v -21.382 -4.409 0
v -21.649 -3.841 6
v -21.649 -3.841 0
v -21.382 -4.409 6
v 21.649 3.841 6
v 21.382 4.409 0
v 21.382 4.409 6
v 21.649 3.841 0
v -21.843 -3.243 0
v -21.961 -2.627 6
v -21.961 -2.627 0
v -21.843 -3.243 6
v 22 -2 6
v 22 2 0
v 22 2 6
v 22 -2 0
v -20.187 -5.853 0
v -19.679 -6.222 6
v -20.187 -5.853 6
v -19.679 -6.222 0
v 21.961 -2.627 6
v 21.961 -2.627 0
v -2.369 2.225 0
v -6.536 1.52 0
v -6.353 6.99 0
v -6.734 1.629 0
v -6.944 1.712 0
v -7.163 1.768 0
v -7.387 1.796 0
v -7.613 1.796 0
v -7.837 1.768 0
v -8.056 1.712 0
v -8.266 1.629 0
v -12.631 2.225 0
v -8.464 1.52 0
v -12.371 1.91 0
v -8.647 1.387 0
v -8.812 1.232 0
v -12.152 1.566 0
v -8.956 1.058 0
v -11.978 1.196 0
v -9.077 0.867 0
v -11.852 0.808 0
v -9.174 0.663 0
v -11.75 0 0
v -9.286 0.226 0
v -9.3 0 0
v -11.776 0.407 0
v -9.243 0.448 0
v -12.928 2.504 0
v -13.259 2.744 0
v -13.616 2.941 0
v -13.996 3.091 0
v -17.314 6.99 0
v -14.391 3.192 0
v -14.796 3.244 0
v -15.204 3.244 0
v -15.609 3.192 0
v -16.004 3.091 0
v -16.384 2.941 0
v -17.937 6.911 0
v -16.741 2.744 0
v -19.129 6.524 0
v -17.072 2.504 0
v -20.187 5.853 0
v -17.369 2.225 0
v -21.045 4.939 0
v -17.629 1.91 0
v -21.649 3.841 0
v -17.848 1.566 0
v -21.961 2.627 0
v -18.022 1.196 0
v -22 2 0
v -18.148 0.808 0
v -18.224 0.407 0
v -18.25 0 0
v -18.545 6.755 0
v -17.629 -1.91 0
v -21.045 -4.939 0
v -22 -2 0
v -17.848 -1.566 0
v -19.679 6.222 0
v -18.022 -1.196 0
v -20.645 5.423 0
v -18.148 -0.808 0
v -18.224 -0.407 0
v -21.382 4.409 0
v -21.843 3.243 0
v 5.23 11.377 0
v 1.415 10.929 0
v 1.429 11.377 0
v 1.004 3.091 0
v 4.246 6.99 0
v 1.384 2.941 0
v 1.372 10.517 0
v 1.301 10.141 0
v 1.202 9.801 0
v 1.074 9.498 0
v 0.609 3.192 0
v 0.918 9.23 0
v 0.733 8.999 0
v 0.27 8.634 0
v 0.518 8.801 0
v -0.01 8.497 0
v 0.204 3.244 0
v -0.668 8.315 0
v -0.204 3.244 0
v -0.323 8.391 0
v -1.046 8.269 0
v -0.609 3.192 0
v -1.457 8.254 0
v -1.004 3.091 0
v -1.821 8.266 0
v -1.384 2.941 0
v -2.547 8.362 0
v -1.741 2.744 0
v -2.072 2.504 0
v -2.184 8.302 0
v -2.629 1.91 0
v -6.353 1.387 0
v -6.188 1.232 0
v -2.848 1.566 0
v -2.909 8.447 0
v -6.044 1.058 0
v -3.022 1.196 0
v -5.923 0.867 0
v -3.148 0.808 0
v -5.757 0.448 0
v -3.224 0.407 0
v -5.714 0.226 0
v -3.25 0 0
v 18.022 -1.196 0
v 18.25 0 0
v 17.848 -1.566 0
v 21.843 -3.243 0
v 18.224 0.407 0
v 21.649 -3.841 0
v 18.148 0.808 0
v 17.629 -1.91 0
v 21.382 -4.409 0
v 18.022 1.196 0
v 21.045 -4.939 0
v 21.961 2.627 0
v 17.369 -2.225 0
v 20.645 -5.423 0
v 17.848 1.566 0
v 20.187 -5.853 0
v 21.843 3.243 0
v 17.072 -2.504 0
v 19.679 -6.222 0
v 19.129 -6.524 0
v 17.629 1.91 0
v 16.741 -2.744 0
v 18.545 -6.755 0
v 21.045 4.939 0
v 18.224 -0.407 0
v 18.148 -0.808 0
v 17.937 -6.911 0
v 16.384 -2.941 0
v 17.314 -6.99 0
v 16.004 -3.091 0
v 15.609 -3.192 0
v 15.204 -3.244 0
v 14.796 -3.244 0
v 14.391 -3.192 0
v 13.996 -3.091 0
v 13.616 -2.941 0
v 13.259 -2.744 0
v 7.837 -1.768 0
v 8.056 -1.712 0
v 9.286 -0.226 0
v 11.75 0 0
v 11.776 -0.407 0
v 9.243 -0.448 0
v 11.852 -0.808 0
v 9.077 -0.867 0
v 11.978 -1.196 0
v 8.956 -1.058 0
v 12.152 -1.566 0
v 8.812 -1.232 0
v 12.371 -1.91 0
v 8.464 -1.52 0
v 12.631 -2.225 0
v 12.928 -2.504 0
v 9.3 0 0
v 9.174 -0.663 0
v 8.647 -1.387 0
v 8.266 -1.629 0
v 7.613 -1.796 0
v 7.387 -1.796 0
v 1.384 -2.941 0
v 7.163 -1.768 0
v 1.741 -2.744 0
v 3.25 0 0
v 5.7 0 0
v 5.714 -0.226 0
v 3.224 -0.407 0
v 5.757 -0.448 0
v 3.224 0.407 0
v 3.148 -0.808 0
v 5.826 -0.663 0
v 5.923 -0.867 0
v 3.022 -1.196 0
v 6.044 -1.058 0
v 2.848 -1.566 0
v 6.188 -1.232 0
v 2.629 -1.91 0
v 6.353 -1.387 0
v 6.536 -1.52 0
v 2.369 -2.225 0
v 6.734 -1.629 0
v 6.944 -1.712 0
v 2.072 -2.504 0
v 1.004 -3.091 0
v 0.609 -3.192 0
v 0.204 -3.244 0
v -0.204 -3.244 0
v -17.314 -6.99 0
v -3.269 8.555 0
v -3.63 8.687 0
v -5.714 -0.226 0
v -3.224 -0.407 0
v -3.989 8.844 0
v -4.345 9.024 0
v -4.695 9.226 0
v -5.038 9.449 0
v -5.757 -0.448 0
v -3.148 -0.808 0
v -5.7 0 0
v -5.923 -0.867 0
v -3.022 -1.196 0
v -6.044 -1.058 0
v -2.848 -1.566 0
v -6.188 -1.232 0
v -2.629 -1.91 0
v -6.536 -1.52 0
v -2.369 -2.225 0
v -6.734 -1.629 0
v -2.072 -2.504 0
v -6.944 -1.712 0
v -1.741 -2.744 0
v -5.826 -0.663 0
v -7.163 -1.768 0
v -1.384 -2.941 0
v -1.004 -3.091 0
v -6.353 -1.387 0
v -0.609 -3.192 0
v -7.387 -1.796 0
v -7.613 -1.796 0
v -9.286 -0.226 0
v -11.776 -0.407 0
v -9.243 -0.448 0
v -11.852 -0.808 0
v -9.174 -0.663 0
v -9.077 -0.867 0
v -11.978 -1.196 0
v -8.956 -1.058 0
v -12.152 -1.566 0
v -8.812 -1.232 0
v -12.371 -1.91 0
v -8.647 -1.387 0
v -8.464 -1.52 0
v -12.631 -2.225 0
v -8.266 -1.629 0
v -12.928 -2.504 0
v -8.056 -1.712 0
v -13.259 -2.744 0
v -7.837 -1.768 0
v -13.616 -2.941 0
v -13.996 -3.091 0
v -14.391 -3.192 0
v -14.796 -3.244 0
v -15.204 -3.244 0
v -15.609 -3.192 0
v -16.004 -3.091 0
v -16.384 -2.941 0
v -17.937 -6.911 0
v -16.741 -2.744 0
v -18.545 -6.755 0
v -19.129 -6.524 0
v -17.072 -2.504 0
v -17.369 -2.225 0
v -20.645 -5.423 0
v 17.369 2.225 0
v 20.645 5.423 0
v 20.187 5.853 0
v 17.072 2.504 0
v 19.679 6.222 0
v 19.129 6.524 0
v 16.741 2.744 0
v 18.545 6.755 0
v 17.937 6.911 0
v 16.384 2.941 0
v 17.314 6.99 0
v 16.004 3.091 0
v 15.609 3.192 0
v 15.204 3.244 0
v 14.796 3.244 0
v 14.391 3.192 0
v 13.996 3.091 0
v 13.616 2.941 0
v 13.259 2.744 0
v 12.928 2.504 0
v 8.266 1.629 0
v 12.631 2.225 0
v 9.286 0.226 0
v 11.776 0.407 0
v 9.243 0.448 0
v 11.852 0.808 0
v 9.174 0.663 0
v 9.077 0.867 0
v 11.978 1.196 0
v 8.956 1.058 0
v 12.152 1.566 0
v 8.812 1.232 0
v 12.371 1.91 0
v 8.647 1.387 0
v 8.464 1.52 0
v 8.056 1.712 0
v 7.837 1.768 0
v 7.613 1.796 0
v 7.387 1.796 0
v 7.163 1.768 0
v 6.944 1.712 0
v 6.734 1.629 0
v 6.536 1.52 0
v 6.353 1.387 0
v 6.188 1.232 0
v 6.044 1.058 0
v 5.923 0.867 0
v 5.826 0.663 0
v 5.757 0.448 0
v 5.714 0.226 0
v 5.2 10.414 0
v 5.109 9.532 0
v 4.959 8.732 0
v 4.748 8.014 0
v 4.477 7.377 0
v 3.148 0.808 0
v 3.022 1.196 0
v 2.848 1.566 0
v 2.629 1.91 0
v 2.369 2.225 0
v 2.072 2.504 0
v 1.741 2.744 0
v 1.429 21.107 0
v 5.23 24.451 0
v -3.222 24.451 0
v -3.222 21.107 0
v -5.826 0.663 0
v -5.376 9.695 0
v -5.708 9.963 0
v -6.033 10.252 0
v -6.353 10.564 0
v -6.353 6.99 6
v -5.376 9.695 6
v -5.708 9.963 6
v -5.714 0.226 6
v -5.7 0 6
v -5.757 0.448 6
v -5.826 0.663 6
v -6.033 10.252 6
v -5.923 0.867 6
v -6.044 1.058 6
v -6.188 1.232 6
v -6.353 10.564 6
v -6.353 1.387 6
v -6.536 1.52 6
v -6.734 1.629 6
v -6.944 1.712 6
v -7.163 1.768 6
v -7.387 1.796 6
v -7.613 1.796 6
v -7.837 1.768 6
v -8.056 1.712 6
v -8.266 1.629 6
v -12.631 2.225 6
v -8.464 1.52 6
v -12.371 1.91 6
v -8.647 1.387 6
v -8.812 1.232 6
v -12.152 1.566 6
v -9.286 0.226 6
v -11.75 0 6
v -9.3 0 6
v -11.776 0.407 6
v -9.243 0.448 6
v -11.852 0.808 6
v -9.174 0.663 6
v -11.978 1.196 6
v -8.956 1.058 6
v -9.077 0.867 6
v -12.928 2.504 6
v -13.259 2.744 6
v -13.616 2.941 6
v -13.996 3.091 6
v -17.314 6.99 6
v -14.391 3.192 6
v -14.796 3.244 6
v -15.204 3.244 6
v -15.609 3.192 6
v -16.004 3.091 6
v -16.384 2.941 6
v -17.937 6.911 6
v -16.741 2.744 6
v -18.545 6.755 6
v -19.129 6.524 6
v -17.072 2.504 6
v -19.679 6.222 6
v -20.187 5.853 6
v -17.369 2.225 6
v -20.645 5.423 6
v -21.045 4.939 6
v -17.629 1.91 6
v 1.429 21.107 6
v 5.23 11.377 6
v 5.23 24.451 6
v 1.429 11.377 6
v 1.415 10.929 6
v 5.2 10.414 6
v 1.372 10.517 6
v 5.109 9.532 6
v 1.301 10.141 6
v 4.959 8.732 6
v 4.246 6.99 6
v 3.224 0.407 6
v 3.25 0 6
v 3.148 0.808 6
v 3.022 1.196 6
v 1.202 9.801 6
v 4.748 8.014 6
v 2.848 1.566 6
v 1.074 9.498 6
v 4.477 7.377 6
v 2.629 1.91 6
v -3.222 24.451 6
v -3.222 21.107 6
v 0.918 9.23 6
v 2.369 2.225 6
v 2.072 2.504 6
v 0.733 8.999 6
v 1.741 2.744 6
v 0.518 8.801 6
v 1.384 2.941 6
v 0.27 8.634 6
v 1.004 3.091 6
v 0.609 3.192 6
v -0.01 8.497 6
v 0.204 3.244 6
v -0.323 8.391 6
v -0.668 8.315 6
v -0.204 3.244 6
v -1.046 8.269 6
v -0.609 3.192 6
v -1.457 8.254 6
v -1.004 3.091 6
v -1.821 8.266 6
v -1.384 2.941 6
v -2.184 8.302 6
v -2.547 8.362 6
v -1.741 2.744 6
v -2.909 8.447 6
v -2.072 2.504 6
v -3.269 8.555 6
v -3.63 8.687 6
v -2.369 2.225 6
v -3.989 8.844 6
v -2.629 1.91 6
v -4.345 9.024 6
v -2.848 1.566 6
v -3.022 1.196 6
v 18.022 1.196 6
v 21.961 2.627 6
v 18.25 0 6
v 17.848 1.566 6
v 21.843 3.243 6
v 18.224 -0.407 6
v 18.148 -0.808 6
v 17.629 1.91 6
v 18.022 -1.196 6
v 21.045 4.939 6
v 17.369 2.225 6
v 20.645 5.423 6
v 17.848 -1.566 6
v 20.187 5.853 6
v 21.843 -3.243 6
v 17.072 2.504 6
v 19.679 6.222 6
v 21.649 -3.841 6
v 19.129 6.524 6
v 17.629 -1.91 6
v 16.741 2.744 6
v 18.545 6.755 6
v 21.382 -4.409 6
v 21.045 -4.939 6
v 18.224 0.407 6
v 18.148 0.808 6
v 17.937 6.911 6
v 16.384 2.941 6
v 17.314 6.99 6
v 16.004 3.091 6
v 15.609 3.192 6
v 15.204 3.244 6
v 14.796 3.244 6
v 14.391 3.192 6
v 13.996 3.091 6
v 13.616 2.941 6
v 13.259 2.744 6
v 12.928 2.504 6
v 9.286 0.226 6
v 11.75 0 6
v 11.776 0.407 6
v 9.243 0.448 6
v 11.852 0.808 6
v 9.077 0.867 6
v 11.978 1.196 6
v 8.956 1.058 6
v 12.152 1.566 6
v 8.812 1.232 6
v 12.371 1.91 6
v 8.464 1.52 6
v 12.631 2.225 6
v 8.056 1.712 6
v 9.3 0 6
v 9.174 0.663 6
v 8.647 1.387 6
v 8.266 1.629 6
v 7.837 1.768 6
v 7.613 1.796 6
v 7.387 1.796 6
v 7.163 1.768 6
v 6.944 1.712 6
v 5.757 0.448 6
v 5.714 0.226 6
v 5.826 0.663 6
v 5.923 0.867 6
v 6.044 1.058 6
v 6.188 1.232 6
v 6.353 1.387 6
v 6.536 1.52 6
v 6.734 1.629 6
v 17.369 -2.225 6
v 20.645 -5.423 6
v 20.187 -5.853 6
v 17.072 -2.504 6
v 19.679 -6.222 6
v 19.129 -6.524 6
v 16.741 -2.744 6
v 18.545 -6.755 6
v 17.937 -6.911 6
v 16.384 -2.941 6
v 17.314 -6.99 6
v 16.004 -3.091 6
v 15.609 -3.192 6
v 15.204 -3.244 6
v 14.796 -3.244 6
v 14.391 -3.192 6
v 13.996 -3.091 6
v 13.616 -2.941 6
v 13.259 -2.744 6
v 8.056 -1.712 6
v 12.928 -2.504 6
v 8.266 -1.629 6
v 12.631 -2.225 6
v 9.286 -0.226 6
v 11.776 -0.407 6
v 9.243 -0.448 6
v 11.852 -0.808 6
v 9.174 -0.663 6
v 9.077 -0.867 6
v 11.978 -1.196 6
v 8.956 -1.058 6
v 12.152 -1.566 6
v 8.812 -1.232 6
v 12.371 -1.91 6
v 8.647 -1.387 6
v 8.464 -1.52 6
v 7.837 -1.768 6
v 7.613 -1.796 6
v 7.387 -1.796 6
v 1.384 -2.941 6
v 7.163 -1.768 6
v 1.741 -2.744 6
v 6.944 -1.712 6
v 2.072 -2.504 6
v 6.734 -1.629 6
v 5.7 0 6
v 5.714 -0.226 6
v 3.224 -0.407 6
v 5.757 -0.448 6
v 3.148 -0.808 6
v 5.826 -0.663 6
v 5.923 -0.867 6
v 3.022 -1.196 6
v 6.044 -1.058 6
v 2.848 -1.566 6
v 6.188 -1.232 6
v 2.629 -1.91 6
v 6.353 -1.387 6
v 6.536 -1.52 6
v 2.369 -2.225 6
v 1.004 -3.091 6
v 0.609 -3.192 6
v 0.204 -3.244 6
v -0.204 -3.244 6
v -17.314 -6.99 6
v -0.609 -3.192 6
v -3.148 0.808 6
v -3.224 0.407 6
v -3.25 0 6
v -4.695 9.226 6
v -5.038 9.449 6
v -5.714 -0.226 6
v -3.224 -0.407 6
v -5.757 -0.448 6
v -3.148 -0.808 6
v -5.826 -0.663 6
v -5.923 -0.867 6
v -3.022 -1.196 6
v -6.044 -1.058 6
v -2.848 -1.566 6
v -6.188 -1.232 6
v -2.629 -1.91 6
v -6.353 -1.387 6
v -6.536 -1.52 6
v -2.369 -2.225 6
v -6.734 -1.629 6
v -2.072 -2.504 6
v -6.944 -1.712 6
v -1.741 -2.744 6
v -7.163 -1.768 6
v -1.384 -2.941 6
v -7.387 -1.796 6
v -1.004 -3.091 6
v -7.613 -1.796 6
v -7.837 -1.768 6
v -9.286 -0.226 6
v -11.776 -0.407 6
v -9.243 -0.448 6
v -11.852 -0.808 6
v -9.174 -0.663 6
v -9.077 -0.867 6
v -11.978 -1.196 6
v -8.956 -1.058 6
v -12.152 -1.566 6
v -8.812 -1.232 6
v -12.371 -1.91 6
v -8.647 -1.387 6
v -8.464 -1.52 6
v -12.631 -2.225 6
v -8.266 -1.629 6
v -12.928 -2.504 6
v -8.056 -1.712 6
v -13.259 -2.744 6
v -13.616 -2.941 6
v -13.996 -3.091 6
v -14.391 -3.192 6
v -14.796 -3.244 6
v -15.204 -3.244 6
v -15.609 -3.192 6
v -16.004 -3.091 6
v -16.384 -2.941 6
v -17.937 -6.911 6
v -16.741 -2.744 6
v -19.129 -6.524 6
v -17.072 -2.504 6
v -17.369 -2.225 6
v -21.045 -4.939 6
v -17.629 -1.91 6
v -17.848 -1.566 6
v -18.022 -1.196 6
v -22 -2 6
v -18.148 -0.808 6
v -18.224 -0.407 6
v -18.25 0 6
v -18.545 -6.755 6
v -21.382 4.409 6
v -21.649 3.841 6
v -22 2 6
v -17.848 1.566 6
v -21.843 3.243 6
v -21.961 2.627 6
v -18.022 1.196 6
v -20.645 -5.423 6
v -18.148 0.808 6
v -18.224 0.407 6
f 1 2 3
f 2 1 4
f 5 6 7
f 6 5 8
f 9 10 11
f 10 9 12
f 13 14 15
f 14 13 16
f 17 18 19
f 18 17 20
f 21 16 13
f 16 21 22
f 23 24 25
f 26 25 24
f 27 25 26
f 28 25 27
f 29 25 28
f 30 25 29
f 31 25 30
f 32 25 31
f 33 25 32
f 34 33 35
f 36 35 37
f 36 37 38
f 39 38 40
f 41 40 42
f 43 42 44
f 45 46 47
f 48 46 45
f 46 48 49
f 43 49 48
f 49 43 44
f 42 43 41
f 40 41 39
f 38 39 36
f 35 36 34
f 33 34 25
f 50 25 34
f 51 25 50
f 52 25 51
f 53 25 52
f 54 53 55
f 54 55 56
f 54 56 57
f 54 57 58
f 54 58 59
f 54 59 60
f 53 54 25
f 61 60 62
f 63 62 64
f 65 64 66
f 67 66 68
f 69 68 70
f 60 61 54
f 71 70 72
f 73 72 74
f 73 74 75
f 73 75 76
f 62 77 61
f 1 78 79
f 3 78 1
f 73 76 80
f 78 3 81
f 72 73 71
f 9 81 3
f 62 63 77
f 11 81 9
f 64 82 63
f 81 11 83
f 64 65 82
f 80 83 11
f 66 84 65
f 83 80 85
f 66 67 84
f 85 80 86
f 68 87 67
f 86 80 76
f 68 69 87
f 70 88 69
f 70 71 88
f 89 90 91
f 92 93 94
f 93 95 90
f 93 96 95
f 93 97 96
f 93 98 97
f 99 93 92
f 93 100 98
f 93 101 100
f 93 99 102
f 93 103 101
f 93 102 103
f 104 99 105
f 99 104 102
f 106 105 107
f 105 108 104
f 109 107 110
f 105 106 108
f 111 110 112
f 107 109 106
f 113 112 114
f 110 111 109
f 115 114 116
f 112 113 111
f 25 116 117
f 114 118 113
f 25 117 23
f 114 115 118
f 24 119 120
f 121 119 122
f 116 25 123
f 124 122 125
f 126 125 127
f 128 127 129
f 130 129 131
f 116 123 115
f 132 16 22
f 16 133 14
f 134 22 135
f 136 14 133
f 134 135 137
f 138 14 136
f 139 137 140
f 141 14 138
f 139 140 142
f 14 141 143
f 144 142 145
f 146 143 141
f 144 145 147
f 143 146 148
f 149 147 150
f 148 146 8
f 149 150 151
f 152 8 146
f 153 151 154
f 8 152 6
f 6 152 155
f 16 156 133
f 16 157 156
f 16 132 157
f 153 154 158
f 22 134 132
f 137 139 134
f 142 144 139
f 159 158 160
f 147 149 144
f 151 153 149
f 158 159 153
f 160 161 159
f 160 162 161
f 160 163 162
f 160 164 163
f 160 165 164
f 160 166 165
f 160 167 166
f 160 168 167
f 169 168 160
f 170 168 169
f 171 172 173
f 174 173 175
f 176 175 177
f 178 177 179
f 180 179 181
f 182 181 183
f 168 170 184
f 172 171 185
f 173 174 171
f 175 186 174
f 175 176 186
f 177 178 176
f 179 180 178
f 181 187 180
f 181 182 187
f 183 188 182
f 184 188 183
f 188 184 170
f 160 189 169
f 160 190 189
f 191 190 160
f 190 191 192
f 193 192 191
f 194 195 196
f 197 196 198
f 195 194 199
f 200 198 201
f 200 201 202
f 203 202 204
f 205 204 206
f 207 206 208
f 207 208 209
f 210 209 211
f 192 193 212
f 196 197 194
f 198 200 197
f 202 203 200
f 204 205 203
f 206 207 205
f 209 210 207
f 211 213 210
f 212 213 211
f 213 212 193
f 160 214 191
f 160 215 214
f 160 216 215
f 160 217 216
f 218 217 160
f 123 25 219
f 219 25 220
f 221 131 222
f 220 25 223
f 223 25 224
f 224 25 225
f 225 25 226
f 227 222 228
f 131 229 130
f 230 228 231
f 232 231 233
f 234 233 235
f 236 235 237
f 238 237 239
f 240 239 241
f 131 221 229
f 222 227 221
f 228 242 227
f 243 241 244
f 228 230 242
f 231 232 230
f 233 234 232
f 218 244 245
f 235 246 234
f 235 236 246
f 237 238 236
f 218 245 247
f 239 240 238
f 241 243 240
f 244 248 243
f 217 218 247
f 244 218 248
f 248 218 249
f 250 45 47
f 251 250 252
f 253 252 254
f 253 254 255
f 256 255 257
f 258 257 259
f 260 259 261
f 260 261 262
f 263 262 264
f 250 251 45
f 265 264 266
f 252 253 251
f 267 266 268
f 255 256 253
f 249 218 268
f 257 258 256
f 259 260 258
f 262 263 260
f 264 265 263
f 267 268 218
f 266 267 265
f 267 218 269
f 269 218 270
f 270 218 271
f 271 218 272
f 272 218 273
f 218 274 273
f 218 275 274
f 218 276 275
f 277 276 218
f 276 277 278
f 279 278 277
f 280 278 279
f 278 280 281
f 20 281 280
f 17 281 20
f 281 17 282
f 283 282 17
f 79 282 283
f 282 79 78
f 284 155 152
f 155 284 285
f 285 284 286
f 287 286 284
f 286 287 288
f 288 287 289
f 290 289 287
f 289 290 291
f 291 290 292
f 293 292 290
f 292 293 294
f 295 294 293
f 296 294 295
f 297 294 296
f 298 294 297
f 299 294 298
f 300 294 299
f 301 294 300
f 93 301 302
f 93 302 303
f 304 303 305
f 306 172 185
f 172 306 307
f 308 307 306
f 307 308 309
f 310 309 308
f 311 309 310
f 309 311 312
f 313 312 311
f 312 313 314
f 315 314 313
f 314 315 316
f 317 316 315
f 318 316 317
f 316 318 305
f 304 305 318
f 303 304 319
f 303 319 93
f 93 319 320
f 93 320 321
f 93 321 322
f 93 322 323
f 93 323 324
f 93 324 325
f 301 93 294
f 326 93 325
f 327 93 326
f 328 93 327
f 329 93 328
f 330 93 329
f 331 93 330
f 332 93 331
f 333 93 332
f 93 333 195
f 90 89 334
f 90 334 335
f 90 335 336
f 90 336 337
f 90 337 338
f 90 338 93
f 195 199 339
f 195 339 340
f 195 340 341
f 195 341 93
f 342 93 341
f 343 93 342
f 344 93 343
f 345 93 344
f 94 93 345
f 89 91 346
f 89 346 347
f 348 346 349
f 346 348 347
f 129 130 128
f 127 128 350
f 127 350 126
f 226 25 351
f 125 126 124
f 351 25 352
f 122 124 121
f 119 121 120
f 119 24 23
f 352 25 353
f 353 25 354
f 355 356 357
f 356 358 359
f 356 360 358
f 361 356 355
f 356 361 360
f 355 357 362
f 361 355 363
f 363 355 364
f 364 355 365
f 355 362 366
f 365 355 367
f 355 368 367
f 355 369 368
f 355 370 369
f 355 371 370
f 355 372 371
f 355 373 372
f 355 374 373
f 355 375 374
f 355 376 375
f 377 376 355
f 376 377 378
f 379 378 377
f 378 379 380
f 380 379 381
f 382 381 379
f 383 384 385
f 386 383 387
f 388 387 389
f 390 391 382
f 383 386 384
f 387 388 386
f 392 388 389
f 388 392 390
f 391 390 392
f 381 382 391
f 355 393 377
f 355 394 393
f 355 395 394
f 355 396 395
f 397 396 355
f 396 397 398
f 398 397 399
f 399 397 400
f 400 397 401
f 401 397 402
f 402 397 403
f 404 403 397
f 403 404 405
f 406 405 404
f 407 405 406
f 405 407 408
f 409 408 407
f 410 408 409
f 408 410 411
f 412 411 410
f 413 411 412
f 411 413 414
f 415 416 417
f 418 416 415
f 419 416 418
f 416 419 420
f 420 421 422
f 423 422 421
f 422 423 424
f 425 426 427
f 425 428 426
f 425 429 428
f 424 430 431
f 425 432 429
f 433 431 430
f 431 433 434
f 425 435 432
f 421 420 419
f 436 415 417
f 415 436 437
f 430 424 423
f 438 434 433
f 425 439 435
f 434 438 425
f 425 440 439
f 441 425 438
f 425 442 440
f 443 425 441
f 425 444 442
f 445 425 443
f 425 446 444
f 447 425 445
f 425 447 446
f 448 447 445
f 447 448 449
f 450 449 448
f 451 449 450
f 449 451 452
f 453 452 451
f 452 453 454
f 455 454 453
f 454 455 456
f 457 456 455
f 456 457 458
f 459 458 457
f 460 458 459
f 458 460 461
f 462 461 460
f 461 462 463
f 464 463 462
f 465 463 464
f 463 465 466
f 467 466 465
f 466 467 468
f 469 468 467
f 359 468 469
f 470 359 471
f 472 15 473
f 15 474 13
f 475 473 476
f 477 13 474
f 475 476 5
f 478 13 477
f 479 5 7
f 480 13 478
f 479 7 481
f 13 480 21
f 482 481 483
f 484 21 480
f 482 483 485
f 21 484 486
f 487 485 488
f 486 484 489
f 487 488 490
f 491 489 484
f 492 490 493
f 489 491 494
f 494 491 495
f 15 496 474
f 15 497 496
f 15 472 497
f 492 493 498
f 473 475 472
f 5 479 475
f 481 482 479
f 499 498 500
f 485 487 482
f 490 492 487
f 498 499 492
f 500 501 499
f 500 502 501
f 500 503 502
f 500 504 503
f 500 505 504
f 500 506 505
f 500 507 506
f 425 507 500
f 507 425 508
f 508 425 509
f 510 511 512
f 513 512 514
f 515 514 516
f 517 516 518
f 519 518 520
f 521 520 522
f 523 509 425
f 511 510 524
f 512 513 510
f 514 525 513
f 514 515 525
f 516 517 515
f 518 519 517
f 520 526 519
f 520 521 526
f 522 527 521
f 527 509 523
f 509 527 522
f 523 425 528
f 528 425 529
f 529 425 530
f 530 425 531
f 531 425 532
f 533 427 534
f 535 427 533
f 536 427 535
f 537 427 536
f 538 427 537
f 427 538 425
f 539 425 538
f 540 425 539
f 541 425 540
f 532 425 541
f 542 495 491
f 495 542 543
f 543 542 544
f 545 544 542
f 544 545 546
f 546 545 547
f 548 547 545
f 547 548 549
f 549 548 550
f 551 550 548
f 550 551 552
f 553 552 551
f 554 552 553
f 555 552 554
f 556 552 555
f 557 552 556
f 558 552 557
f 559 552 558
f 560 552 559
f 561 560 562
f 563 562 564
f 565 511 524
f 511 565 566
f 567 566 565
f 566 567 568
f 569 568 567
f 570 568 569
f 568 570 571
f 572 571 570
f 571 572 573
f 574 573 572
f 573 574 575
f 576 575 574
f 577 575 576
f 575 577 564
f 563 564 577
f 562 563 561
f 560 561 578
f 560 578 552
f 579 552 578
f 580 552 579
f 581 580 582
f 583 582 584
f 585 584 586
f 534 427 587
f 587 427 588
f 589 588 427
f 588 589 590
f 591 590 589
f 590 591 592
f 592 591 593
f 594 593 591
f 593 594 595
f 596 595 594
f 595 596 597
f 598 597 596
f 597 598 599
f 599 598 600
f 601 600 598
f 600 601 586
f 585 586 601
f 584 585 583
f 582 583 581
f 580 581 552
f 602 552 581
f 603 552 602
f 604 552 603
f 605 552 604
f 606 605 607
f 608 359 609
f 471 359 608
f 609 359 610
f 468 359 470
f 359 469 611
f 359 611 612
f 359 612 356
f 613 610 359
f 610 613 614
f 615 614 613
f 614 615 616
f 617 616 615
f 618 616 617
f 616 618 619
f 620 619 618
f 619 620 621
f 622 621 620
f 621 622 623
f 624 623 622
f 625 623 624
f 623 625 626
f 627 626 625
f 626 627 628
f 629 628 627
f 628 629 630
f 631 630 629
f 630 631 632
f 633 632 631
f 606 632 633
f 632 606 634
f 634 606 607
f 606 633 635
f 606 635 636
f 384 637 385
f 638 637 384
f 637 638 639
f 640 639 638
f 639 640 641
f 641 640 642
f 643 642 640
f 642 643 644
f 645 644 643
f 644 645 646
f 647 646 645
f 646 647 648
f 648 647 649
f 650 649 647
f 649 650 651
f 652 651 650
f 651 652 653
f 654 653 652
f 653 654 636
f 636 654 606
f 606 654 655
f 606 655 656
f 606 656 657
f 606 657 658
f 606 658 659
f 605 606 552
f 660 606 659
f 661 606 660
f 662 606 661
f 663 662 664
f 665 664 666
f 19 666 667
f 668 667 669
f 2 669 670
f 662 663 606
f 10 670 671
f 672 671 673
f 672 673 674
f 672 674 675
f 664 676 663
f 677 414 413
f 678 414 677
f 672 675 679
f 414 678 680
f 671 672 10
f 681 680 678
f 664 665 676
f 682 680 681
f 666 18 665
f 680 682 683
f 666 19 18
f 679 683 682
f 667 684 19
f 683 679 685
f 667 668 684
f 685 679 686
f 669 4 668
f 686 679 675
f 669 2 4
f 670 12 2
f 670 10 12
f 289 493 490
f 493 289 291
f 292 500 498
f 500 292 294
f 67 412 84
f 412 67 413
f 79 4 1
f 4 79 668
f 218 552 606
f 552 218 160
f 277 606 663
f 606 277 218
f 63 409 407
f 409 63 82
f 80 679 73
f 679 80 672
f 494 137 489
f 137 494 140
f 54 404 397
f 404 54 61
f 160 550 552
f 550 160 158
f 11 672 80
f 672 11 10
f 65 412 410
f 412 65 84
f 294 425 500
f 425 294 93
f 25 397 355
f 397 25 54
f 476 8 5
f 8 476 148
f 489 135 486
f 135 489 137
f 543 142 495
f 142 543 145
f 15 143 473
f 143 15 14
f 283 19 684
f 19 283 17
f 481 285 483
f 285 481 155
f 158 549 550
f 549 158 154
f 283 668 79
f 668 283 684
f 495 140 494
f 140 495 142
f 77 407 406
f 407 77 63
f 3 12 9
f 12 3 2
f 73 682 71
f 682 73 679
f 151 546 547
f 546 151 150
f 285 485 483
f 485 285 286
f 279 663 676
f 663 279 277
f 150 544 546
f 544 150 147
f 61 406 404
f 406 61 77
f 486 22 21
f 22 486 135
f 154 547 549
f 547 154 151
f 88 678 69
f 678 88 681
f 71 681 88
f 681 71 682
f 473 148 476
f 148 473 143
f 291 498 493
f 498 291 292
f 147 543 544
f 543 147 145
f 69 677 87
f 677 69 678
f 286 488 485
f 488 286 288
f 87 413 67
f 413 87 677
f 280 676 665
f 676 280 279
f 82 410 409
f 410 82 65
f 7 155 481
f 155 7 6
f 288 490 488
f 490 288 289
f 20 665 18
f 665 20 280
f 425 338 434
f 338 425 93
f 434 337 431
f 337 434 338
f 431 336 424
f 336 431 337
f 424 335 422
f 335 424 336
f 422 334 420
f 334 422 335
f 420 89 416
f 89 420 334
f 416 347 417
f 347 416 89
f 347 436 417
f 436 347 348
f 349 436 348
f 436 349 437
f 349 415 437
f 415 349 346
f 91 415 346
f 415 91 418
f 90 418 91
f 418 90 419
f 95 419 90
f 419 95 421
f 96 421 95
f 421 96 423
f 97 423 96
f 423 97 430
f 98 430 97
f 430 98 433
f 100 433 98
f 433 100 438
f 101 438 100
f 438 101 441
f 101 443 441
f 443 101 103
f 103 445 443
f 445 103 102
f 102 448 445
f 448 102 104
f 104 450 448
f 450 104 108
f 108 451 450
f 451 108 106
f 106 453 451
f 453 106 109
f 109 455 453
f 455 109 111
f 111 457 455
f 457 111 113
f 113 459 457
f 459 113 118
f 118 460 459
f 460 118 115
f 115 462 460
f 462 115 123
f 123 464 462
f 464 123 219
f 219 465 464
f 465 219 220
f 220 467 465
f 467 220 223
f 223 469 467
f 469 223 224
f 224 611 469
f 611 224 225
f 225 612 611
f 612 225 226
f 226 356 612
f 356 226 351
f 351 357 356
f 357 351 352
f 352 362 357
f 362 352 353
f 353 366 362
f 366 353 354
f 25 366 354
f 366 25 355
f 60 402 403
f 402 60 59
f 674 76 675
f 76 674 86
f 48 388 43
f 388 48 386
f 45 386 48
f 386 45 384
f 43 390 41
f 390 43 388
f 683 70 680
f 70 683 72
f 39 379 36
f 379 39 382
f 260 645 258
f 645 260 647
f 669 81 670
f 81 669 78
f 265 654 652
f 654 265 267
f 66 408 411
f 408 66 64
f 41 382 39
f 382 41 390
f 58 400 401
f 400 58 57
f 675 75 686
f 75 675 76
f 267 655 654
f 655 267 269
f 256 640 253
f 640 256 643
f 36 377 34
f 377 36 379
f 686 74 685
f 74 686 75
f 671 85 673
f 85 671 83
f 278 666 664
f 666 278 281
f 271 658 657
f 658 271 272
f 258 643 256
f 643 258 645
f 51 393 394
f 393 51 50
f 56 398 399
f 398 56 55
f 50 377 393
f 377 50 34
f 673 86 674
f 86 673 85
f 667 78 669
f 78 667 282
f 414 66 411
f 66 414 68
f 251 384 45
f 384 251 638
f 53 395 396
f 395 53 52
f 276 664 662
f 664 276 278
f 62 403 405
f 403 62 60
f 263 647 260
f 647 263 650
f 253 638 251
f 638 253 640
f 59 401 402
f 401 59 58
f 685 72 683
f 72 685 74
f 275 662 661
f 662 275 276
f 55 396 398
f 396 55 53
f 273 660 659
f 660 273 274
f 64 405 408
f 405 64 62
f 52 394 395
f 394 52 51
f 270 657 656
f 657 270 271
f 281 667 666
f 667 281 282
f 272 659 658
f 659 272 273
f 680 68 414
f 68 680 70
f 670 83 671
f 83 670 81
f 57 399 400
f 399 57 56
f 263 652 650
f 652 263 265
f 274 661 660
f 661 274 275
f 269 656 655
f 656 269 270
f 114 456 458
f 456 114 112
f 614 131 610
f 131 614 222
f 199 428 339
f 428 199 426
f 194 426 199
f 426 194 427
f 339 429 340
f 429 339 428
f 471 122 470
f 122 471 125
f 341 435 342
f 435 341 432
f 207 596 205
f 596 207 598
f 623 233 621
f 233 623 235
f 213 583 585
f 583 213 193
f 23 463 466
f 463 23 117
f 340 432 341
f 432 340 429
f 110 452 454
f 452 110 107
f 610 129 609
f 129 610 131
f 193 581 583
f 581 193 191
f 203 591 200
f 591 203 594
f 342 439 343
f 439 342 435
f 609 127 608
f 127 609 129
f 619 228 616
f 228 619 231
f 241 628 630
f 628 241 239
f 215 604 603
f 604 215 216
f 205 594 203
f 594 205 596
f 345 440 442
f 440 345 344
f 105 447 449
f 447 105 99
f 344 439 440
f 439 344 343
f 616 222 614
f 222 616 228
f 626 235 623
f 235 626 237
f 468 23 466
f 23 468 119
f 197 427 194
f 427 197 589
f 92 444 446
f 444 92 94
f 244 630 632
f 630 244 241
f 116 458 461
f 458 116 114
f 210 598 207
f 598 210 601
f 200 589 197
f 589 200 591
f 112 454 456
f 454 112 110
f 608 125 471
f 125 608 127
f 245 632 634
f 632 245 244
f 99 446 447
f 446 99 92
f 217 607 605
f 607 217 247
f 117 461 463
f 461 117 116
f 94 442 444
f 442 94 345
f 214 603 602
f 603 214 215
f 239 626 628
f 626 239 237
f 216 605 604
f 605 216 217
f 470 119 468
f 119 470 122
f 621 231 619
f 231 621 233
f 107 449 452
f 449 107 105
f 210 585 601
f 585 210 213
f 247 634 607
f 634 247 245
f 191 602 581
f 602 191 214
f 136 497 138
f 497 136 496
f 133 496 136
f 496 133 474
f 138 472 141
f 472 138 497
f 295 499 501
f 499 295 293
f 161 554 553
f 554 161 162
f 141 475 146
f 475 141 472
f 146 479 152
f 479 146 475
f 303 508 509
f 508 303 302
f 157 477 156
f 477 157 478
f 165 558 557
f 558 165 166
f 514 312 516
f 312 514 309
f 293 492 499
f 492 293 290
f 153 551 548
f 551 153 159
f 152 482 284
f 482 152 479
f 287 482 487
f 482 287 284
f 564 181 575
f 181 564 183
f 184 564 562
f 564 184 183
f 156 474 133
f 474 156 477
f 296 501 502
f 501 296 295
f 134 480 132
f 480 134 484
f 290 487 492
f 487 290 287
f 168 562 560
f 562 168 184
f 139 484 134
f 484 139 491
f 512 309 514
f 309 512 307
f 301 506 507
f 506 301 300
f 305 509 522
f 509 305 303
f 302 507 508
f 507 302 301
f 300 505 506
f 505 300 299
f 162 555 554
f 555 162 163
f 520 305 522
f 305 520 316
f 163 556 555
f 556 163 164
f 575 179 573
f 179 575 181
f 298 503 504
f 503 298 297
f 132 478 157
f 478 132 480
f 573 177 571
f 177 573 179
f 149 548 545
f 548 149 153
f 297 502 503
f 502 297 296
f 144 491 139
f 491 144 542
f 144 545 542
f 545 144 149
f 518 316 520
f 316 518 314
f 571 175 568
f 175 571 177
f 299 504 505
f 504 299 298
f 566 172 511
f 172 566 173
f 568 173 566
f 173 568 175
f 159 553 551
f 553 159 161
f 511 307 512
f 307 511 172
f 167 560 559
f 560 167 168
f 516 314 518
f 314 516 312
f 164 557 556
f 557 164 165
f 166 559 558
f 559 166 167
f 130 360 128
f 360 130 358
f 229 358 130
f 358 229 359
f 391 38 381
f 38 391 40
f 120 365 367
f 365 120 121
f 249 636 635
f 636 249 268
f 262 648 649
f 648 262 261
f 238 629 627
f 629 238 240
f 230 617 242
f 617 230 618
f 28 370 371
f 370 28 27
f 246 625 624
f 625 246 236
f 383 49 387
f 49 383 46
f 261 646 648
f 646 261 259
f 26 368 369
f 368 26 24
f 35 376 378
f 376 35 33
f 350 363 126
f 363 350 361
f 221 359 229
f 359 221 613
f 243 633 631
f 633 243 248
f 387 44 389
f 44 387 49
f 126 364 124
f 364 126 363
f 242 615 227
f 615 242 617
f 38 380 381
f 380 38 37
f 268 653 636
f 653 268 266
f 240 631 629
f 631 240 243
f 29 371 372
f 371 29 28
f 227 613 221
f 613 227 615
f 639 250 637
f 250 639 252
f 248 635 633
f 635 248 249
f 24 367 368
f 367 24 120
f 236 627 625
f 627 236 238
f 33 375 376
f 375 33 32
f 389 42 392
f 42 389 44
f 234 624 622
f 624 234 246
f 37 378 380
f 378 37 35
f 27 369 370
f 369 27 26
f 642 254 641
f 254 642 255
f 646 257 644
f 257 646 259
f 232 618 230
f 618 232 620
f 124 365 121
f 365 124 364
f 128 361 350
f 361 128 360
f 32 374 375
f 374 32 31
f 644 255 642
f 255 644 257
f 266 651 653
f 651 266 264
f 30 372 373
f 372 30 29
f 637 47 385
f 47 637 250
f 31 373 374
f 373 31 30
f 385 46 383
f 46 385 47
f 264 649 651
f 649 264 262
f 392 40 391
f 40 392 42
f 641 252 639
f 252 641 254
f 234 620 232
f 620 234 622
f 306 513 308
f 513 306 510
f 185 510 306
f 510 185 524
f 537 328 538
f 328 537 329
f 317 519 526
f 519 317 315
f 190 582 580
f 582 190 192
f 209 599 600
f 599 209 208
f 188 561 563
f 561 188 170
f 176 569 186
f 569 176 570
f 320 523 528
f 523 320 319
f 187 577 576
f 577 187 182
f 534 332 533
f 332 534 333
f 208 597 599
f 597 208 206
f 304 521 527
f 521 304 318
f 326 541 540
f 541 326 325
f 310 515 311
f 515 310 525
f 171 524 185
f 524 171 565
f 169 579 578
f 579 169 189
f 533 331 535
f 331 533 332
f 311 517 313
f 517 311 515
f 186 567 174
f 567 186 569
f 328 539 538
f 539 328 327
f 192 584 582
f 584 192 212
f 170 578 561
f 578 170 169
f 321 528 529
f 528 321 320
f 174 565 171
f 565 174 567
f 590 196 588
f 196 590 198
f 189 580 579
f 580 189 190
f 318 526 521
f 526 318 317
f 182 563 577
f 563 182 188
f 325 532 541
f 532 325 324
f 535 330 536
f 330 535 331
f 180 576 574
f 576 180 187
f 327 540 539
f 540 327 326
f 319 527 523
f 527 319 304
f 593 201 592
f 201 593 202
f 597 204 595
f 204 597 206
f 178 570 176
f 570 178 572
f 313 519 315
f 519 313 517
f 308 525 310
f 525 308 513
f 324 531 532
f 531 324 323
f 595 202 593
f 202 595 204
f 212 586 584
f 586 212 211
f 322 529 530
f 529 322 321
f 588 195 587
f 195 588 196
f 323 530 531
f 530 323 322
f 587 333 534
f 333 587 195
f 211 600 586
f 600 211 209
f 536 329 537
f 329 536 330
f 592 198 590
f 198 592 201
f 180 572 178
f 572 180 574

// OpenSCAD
$fn = 50;


difference() {
	union() {
		hull() {
			translate(v = [-17.0000000000, 2.0000000000, 0]) {
				cylinder(h = 6, r = 5);
			}
			translate(v = [17.0000000000, 2.0000000000, 0]) {
				cylinder(h = 6, r = 5);
			}
			translate(v = [-17.0000000000, -2.0000000000, 0]) {
				cylinder(h = 6, r = 5);
			}
			translate(v = [17.0000000000, -2.0000000000, 0]) {
				cylinder(h = 6, r = 5);
			}
		}
		translate(v = [0, 24, 0]) {
			linear_extrude(height = 6) {
				text(font = "DejaVu Sans Mono:style=Bold", halign = "center", size = 19.0000000000, text = "J", valign = "top");
			}
		}
	}
	union() {
		translate(v = [-15.0000000000, 0.0000000000, 0]) {
			translate(v = [0, 0, -100]) {
				cylinder(h = 200, r = 3.2500000000);
			}
		}
		translate(v = [0, 0, -100]) {
			cylinder(h = 200, r = 3.2500000000);
		}
		translate(v = [15.0000000000, 0.0000000000, 0]) {
			translate(v = [0, 0, -100]) {
				cylinder(h = 200, r = 3.2500000000);
			}
		}
		translate(v = [-15.0000000000, 0.0000000000, 0]) {
			translate(v = [0, 0, -100]) {
				cylinder(h = 200, r = 1.8000000000);
			}
		}
		translate(v = [-7.5000000000, 0.0000000000, 0]) {
			translate(v = [0, 0, -100]) {
				cylinder(h = 200, r = 1.8000000000);
			}
		}
		translate(v = [0, 0, -100]) {
			cylinder(h = 200, r = 1.8000000000);
		}
		translate(v = [7.5000000000, 0.0000000000, 0]) {
			translate(v = [0, 0, -100]) {
				cylinder(h = 200, r = 1.8000000000);
			}
		}
		translate(v = [15.0000000000, 0.0000000000, 0]) {
			translate(v = [0, 0, -100]) {
				cylinder(h = 200, r = 1.8000000000);
			}
		}
	}
}
